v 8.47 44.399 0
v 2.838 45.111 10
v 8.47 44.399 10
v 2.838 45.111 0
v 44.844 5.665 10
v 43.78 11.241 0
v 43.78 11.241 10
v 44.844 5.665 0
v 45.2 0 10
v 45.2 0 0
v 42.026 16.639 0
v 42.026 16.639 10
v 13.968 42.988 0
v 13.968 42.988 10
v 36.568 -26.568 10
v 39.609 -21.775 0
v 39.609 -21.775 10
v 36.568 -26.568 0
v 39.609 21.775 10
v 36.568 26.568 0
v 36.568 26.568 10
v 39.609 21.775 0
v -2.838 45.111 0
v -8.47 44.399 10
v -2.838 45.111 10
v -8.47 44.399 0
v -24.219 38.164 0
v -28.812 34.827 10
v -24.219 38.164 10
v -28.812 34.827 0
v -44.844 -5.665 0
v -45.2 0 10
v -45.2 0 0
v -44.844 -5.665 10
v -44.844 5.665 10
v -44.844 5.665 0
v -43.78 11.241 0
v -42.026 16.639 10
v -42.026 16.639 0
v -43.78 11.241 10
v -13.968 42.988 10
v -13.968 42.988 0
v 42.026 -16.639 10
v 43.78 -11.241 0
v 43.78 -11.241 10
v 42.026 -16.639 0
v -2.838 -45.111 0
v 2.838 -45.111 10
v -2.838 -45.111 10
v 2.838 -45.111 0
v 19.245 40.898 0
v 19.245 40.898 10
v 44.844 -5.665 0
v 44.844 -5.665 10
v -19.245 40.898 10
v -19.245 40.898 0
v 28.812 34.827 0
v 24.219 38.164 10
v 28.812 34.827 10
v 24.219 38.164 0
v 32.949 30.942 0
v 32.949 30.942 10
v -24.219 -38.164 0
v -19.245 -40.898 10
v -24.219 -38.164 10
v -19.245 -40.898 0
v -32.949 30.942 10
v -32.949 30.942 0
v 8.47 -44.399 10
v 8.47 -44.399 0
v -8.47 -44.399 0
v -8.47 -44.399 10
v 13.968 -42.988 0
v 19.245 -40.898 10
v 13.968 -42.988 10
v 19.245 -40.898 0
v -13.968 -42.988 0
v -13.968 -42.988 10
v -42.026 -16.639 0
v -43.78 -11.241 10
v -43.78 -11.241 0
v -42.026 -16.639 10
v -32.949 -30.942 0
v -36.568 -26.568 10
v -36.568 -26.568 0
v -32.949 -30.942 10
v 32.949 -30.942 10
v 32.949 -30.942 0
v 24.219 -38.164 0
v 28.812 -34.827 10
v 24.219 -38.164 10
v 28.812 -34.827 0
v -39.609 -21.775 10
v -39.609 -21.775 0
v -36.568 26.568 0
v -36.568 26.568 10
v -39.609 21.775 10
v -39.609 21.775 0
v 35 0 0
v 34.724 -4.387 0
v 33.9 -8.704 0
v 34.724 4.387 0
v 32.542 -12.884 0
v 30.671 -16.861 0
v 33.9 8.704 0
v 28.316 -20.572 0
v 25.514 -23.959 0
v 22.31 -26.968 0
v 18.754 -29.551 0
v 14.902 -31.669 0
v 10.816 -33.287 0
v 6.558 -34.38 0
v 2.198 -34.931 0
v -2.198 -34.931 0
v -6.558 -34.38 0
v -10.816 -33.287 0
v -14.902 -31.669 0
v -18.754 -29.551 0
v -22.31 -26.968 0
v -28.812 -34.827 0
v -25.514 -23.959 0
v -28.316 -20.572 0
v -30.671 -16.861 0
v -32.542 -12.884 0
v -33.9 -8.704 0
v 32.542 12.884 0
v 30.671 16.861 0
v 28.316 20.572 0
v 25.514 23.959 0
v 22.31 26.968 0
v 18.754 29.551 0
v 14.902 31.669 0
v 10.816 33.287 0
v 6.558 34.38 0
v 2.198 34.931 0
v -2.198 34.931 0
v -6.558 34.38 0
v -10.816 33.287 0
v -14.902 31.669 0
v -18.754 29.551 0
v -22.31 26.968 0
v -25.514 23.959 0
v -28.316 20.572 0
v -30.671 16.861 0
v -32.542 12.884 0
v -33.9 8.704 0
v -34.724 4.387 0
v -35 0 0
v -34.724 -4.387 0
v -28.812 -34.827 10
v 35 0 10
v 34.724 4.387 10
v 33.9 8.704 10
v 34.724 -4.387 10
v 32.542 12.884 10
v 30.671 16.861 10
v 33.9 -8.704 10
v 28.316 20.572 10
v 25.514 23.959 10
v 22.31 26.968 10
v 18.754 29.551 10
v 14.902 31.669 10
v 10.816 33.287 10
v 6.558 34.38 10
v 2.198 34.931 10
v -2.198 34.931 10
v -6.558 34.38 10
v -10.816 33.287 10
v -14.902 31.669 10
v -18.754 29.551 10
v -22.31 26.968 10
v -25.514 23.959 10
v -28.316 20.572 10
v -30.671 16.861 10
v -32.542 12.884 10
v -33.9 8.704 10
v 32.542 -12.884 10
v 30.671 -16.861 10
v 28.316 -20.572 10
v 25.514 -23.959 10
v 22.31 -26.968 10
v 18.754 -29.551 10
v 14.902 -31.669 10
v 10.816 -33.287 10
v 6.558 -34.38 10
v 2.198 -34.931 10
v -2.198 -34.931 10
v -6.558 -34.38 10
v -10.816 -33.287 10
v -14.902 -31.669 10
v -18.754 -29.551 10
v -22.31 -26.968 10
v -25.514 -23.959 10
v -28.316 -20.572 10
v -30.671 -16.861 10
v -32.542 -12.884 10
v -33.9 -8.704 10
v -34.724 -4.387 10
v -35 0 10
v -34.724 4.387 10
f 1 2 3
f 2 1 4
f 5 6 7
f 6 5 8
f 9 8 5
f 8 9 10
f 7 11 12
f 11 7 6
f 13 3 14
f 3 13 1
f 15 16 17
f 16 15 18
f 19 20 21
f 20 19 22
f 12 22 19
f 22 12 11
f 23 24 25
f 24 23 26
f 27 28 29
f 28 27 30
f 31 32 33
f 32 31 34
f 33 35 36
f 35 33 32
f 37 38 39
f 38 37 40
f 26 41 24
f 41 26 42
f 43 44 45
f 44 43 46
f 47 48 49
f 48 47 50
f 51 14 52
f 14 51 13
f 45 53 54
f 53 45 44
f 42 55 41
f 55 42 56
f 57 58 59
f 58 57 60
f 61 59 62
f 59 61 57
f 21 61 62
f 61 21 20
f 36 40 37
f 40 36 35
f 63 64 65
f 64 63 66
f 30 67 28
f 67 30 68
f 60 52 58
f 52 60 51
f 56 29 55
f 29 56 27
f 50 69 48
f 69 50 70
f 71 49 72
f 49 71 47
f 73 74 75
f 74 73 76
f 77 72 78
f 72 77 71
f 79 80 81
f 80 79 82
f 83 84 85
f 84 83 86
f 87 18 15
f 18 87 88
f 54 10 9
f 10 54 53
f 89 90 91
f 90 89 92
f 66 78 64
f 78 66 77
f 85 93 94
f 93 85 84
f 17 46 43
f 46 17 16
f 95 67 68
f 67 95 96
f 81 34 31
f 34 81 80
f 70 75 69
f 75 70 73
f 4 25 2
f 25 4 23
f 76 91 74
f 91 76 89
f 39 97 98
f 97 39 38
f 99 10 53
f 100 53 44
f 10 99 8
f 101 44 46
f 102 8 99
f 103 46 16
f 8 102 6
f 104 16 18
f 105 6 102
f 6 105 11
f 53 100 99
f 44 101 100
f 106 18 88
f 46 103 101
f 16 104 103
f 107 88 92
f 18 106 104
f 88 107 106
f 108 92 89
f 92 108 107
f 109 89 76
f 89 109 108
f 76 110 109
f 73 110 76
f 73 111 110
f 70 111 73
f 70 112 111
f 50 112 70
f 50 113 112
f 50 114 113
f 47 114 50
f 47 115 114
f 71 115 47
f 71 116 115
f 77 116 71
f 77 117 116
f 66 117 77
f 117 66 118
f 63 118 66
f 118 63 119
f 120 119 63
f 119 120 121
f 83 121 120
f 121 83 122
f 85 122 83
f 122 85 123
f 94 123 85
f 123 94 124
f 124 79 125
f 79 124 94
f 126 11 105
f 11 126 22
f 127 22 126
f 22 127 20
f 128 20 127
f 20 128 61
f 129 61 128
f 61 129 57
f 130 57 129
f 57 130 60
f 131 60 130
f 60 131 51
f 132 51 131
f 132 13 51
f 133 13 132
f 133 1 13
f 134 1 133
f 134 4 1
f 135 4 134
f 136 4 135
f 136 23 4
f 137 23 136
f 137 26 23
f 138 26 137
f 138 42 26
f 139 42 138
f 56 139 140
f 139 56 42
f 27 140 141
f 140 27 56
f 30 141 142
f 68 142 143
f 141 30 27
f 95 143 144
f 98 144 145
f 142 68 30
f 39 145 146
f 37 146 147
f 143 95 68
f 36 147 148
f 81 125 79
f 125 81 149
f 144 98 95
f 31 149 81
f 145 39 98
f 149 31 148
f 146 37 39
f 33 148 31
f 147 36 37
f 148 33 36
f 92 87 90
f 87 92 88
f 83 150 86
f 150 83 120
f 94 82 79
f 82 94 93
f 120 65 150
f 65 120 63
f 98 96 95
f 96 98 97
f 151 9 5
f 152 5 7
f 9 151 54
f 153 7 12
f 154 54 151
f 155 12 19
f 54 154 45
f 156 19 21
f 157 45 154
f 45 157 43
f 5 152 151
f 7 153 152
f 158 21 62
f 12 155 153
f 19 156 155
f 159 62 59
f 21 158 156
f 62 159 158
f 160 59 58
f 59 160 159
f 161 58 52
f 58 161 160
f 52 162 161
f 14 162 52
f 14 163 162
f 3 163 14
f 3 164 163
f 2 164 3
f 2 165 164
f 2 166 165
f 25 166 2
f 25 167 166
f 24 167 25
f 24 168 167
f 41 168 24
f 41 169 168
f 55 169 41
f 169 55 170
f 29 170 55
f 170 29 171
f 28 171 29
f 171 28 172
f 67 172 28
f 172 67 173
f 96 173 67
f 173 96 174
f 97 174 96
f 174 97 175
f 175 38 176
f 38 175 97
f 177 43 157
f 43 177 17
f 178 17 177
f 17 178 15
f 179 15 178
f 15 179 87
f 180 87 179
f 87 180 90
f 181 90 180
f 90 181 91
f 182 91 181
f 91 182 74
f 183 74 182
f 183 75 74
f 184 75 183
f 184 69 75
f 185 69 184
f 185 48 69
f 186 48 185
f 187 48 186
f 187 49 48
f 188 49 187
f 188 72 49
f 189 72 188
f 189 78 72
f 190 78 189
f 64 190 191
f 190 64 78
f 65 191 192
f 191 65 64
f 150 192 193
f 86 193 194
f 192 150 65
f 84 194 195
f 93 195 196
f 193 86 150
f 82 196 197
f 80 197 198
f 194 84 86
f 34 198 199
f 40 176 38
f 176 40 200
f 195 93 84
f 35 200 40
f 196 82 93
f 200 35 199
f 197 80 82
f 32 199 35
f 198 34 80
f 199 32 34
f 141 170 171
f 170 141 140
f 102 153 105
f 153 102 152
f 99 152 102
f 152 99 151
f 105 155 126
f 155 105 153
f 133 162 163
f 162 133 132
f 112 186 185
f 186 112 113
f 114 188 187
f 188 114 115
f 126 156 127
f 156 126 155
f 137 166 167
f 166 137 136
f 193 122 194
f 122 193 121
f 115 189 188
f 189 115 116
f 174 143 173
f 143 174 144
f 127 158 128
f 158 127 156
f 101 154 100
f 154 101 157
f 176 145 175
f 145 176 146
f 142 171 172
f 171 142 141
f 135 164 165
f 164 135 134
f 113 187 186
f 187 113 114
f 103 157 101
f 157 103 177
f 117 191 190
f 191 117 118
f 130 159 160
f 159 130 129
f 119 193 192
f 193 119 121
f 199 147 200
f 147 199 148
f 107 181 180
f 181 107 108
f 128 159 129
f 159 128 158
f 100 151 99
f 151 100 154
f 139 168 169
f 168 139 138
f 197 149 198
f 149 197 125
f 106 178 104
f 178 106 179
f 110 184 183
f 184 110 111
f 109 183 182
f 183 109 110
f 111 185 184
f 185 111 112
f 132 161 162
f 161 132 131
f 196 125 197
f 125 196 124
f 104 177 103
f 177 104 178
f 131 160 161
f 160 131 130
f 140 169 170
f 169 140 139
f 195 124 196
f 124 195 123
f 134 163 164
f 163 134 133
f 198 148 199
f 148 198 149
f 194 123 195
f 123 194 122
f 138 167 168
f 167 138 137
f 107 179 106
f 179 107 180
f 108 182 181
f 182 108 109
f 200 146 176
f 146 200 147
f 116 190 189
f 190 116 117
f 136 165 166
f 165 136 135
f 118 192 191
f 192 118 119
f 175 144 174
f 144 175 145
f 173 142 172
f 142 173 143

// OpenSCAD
$fn = 50;


difference() {
	union() {
		cylinder(h = 10, r = 45.2000000000);
	}
	union() {
		cylinder(h = 10, r = 35.0000000000);
	}
}
